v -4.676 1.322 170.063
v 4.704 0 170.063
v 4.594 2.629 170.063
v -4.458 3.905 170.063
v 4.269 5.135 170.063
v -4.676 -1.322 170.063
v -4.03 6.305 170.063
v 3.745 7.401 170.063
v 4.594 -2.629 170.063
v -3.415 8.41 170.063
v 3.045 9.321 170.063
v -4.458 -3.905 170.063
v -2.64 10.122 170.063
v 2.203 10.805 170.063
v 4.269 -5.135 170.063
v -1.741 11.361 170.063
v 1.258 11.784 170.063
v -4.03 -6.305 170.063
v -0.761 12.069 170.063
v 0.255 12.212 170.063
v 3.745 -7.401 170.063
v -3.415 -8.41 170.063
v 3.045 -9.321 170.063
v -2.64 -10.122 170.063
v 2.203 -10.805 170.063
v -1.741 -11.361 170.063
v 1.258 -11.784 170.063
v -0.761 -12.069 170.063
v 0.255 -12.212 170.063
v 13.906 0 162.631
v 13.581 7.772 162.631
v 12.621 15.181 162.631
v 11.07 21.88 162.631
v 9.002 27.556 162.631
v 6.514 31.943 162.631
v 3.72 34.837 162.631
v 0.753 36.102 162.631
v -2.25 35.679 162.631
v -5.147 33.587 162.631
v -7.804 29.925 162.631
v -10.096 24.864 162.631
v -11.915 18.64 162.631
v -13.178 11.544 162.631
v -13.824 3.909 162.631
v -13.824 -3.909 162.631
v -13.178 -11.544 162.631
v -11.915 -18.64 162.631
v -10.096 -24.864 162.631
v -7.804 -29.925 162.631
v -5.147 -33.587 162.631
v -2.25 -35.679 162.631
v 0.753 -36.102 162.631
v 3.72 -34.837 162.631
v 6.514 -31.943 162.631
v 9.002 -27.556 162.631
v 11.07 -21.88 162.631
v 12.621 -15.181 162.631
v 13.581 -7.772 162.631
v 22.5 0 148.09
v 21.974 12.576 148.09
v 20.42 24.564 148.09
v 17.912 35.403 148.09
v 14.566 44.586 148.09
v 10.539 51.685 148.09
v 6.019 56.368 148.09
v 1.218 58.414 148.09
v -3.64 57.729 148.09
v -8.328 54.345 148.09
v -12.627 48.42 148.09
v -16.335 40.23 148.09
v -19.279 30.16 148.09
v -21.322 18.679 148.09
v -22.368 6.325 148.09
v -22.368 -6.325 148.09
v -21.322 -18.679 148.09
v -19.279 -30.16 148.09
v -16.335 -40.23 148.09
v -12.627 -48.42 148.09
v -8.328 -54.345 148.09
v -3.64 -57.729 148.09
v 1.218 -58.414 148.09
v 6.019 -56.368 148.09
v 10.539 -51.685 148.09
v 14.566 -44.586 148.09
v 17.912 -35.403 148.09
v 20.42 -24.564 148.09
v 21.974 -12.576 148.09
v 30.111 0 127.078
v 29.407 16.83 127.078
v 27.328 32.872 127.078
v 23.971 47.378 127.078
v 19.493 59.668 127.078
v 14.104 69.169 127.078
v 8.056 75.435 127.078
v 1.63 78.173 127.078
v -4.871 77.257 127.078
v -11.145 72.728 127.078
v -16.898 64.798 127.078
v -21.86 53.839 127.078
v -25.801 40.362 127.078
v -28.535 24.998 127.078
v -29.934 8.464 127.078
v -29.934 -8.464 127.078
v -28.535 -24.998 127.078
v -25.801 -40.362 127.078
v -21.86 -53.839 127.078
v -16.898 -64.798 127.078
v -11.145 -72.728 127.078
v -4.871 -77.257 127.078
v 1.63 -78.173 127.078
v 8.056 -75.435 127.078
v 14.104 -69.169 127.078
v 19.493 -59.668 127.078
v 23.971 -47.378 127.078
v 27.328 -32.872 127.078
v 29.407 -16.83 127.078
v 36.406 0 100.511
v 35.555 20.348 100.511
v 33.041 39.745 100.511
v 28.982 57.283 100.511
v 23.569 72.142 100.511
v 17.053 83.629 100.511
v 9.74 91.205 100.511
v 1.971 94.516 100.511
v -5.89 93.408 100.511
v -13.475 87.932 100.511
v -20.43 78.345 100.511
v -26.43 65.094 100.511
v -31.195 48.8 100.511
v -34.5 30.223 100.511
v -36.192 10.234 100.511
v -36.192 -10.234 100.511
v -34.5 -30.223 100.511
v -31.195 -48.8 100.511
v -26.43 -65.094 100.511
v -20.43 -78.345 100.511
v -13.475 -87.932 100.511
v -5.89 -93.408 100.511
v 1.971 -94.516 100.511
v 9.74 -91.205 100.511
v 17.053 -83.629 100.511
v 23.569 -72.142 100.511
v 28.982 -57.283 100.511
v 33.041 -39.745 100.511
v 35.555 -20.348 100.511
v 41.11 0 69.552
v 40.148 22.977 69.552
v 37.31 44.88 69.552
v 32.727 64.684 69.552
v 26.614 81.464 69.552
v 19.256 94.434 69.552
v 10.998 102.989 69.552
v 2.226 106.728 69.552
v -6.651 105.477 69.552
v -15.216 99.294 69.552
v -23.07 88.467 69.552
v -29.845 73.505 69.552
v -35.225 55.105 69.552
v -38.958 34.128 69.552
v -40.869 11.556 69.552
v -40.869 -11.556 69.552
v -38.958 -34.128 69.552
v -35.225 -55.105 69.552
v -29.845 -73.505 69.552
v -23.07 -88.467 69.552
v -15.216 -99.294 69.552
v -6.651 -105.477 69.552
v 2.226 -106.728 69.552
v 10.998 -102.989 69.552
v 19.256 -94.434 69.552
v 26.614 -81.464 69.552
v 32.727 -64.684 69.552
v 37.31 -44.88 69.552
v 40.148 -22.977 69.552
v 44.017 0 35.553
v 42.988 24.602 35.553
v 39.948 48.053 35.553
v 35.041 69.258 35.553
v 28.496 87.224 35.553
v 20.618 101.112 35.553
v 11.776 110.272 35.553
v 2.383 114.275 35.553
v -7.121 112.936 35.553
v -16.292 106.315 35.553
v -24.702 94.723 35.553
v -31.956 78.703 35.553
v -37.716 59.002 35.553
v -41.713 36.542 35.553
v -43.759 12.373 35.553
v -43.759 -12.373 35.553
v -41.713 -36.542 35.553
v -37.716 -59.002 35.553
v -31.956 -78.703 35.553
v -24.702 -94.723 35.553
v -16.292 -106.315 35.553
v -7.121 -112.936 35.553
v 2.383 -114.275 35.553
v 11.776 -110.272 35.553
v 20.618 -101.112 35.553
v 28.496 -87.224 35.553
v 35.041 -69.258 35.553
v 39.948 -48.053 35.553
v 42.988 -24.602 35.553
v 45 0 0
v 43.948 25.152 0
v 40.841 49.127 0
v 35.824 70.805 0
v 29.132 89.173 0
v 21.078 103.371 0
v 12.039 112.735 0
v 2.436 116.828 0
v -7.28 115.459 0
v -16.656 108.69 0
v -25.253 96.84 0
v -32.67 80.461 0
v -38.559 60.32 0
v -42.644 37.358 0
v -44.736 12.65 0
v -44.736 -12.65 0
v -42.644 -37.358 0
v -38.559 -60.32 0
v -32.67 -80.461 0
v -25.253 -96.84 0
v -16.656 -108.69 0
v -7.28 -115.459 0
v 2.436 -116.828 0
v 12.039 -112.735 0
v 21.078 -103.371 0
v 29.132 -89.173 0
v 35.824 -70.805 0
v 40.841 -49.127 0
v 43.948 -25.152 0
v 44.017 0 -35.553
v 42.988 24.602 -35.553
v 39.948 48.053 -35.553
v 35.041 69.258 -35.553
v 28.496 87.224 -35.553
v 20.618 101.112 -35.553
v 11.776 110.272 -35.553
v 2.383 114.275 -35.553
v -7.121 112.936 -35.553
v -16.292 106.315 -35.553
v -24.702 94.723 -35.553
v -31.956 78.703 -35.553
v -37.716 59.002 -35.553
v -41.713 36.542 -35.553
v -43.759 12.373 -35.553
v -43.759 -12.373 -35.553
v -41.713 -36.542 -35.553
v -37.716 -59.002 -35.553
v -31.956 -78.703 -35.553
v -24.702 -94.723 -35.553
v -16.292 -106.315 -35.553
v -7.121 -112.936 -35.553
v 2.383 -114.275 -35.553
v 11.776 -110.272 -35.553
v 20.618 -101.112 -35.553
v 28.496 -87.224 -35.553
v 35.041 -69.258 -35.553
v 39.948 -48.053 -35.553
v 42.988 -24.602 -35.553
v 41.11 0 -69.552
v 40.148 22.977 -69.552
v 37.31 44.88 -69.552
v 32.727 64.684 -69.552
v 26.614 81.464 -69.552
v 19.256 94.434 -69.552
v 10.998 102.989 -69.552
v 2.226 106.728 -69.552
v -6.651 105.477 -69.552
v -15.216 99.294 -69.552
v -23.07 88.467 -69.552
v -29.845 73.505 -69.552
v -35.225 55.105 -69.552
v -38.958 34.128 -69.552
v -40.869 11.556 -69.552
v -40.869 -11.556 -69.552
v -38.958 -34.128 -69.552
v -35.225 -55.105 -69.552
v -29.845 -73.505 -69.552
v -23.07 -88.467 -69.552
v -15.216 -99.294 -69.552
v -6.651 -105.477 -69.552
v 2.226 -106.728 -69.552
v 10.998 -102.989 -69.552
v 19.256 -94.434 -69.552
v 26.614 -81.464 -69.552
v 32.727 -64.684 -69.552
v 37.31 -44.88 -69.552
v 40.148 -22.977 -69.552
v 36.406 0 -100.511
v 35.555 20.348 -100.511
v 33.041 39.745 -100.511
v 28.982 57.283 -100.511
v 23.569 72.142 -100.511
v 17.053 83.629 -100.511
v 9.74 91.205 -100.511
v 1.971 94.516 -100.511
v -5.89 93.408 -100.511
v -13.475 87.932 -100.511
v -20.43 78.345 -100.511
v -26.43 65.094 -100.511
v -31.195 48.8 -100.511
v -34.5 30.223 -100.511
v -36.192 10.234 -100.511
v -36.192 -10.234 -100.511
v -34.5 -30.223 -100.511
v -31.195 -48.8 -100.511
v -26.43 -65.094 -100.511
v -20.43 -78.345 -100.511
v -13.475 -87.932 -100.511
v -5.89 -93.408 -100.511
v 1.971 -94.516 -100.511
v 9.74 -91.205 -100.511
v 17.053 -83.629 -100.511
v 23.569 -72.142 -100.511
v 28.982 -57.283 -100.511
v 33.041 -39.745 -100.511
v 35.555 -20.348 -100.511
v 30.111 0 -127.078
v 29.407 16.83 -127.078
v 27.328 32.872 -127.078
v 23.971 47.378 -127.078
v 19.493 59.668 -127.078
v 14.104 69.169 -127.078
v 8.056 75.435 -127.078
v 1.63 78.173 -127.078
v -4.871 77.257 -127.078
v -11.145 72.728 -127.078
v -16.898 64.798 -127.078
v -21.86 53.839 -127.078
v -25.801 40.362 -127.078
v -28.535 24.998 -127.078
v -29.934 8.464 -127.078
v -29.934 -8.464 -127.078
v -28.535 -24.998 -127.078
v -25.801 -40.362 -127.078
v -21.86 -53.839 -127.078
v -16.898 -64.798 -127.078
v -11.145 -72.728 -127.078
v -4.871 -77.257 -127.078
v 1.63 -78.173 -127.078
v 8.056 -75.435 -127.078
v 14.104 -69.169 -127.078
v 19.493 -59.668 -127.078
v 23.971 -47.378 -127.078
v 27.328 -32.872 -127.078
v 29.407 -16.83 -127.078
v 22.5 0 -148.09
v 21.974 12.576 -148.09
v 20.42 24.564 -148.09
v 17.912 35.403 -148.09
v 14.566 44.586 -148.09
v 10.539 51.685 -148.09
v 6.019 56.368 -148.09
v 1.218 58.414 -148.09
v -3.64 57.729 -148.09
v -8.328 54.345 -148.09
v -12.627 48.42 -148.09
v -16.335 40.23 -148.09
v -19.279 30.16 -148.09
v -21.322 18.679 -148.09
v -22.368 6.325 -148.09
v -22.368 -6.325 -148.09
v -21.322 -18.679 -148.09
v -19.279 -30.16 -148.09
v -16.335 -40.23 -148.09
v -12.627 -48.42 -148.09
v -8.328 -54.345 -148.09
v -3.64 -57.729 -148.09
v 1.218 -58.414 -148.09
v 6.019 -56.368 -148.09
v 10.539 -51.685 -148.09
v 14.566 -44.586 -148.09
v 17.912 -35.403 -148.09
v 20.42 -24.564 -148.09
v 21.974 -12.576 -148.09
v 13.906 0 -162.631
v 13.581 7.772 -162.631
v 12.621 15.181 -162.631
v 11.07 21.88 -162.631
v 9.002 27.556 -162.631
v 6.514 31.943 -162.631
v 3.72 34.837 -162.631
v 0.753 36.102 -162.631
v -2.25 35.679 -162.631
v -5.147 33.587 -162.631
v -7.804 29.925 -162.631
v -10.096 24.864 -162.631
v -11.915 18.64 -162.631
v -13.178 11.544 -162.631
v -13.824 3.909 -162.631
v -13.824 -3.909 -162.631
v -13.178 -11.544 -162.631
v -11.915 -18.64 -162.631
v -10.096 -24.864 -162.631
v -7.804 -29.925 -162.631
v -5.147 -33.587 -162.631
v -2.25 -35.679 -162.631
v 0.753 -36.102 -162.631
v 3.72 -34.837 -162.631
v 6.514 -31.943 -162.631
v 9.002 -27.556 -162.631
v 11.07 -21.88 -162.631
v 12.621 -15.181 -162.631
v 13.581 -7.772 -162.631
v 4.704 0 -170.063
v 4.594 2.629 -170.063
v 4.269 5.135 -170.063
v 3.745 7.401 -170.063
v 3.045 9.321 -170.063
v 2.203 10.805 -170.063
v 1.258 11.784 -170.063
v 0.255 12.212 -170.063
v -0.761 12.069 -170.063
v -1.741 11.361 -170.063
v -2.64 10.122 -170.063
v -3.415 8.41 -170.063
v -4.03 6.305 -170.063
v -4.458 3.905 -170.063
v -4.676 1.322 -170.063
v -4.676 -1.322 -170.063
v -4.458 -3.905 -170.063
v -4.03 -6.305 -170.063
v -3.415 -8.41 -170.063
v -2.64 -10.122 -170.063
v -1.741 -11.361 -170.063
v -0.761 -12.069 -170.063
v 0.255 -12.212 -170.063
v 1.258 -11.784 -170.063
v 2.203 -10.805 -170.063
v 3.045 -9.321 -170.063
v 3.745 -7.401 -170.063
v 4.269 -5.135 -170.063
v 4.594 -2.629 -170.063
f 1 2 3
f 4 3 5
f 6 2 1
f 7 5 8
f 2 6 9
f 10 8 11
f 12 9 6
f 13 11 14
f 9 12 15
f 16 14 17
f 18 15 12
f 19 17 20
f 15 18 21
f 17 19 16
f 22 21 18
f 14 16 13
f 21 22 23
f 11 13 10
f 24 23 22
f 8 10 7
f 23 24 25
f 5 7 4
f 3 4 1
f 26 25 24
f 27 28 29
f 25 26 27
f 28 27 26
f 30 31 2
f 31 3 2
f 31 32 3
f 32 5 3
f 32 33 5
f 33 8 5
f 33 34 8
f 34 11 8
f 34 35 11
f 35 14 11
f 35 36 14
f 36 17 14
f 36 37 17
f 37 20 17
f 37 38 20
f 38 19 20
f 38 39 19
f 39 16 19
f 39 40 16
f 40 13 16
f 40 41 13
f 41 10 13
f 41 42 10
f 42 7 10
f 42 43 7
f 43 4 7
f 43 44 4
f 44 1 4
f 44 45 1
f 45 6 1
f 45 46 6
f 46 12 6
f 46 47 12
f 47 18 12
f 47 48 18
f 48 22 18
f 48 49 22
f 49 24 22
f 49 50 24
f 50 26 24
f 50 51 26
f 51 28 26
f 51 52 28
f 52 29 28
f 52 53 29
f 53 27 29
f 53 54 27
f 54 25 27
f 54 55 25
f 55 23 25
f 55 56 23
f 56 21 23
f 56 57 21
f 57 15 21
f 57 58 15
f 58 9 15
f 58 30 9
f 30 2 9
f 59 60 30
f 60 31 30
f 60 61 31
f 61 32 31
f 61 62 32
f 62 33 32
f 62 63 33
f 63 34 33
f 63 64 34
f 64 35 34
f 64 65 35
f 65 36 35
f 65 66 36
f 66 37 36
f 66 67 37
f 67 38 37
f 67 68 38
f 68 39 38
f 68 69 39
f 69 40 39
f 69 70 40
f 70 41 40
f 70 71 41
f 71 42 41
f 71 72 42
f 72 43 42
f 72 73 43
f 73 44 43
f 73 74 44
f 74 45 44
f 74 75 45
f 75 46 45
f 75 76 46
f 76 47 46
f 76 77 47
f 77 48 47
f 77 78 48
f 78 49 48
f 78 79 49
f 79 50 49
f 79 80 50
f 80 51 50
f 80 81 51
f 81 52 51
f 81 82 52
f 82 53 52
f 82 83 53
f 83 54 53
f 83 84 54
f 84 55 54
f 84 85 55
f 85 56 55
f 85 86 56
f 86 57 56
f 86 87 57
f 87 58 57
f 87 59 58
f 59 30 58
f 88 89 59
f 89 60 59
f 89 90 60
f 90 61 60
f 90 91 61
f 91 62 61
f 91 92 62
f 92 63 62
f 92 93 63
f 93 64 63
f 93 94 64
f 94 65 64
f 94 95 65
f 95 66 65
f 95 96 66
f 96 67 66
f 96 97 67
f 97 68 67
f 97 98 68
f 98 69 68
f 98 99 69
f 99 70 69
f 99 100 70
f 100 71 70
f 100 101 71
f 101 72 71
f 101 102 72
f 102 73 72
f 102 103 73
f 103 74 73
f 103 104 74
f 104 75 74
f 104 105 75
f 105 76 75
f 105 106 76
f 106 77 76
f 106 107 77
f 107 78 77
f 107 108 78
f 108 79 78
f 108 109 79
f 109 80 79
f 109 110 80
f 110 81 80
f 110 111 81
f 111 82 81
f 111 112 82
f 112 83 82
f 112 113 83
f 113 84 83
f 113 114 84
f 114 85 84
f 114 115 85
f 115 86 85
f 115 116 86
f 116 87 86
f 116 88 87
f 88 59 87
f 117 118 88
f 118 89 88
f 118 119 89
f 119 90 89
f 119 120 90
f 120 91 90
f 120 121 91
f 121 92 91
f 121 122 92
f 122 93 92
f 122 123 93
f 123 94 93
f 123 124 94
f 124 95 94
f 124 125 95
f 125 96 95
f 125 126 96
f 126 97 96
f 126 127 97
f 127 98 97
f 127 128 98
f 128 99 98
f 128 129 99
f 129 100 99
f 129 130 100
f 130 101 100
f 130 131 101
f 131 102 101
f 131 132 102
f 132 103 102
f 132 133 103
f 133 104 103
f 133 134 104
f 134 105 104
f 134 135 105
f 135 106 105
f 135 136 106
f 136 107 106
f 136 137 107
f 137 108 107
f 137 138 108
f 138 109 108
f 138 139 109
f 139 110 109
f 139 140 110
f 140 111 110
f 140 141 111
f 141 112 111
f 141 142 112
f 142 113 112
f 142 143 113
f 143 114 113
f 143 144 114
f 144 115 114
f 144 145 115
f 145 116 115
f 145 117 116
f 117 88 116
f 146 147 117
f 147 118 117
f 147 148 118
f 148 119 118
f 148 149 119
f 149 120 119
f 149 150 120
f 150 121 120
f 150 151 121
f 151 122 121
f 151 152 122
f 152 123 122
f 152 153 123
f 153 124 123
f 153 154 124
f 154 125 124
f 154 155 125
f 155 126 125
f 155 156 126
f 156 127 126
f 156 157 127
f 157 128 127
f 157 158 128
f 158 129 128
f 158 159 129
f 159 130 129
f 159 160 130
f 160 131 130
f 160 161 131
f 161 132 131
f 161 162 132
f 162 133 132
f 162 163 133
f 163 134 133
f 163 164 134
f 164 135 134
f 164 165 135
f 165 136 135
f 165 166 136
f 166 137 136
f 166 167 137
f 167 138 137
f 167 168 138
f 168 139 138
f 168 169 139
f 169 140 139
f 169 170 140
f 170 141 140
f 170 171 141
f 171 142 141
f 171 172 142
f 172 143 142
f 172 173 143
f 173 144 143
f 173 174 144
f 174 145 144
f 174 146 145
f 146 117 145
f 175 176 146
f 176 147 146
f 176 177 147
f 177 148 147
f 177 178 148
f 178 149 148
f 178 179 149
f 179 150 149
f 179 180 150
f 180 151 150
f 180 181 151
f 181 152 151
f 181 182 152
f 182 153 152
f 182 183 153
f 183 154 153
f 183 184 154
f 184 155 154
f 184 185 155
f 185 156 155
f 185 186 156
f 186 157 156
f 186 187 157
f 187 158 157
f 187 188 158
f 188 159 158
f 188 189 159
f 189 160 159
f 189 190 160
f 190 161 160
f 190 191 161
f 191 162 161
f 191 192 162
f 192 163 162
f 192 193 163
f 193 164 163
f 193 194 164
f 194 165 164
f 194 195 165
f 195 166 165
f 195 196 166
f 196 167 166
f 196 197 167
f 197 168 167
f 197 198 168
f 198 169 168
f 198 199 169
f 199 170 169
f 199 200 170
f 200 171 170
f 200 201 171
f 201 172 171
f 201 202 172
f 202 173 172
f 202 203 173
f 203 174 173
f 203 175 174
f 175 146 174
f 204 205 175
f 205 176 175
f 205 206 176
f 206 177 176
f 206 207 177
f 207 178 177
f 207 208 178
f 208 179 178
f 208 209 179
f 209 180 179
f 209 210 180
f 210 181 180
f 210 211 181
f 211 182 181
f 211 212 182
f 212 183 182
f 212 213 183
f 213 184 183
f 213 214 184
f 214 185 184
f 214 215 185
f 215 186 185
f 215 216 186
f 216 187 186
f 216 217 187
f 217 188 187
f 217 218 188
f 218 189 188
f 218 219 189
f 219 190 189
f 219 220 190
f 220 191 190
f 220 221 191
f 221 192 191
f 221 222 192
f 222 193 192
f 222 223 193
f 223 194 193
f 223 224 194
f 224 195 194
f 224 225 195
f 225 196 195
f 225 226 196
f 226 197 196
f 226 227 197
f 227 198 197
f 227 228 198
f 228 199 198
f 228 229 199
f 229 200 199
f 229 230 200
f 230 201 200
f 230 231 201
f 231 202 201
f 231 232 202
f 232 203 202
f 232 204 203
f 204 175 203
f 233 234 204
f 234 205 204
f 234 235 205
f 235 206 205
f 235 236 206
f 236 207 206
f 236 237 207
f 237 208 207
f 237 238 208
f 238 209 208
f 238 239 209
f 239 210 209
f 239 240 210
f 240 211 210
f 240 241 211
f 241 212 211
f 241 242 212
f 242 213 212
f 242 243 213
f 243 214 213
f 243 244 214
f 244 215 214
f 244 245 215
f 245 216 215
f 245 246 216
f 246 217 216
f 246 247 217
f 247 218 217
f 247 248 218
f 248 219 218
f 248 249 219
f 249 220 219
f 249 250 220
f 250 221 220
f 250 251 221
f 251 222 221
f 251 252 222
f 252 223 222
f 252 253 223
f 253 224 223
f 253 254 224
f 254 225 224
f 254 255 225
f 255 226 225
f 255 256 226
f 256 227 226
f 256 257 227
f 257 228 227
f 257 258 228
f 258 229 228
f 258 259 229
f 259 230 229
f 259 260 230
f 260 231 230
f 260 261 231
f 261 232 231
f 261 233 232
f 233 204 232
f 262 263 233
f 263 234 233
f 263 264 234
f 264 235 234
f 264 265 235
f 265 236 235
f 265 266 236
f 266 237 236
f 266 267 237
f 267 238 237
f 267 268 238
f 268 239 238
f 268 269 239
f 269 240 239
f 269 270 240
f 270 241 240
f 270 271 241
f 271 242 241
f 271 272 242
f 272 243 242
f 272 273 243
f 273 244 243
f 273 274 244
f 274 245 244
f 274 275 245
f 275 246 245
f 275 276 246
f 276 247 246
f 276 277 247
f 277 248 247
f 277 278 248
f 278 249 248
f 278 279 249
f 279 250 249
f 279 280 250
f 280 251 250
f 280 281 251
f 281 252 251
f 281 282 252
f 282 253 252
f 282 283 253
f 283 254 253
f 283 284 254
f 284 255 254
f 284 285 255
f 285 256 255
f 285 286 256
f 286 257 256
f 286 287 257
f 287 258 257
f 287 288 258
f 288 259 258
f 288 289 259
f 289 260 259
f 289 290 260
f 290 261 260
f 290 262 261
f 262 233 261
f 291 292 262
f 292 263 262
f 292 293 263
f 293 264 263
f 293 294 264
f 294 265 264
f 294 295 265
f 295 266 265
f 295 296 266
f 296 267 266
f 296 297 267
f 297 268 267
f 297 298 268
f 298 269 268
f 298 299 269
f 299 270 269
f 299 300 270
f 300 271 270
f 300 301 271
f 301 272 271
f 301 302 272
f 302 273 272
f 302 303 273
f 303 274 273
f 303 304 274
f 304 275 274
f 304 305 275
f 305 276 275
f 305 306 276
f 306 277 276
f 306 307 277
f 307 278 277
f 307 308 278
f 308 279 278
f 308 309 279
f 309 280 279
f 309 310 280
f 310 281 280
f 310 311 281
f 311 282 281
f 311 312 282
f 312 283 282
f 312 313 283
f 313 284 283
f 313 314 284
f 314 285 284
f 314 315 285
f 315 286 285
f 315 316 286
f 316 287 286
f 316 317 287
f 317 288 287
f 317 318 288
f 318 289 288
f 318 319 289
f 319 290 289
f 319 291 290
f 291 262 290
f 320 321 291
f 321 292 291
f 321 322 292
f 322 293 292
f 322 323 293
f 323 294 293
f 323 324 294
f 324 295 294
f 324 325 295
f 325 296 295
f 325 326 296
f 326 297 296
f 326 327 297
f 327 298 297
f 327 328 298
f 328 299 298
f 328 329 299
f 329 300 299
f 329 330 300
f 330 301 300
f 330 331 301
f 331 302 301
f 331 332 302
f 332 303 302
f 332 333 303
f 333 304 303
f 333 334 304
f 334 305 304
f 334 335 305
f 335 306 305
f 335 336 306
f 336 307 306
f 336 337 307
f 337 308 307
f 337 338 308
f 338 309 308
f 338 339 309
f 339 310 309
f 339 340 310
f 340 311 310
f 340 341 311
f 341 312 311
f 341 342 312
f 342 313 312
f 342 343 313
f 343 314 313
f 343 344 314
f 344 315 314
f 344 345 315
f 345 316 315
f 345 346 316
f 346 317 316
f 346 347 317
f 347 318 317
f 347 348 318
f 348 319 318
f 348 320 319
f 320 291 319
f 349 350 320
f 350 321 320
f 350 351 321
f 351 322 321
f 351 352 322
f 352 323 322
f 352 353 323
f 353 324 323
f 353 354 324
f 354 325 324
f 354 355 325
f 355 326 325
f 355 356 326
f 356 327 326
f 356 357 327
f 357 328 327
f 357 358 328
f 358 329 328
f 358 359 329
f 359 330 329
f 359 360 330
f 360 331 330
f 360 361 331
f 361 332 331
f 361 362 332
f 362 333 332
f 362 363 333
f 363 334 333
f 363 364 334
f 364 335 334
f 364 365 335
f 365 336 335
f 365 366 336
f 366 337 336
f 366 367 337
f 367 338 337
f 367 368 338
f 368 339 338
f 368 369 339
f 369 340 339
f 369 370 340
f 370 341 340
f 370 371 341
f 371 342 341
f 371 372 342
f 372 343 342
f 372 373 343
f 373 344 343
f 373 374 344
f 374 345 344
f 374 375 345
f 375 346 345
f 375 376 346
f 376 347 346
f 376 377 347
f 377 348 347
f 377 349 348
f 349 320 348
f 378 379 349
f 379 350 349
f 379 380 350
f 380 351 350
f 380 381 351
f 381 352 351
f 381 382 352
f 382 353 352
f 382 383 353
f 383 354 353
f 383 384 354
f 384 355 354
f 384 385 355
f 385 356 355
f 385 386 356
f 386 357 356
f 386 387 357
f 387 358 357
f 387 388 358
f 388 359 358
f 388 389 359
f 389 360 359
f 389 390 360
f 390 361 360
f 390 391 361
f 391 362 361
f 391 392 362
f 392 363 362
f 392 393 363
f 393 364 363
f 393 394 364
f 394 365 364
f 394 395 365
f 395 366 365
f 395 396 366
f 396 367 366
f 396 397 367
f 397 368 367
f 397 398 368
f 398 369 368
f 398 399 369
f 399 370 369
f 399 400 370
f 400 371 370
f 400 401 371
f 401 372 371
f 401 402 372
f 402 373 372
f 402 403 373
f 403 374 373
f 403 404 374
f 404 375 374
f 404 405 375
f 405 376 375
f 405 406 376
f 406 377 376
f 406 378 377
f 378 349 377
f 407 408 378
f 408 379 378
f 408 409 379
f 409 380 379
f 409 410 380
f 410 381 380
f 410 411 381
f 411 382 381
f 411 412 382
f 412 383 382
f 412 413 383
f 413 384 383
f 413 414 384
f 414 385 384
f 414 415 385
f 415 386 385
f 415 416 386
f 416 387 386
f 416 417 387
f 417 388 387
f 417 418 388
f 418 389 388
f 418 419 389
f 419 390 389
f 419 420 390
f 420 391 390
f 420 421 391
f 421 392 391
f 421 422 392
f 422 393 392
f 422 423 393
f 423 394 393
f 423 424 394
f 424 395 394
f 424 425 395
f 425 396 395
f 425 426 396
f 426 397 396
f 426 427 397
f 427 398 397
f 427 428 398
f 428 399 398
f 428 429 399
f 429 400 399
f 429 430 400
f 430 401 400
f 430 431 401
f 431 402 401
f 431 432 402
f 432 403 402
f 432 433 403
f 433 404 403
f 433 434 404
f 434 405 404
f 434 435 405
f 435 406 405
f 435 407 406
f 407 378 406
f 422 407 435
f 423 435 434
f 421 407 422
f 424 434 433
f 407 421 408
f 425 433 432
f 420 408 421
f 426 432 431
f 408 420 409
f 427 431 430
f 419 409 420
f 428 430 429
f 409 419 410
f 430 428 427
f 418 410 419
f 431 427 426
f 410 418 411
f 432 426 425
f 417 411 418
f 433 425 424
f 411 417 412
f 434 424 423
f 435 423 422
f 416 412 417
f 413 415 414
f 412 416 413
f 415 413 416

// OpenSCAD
// Generated by SolidPython 1.0.1 on 2020-07-29 00:46:46


scale(v = [5, 13, 19]) {
	sphere(r = 9);
}
/***********************************************
*********      SolidPython code:      **********
************************************************
 
# import packages: SolidPython
from solid import *
from solid.utils import *
from itertools import chain, combinations, permutations


class Resize:

    def __init__(self, scad_file):
        self.scad_file = scad_file
        #self.scad_file = import_scad(scad_file)
        # cone/cylinder param:
        self.r1 = 0
        self.r2 = 0
        self.h = 0
        # rectangular prism param:
        self.w = 0
        self.l = 0
        # ellipse param:
        self.r = 0

    # import OpenScad code (file name corresponds to shape)


    # classify shape + parameters
    def assign(self, param1, param2, param3):
        if self.scad_file == 'cone.scad':
            self.r1 = param1
            self.r2 = param2
            self.h = param3
        elif self.scad_file == 'cylinder.scad':
            self.r1 = param1
            self.r2 = param2
            self.h = param3
        elif self.scad_file == 'rectangularPrism.scad':
            self.h = param1
            self.l = param2
            self.w = param3
        else:
            self.r = param1
            self.h = param2

    # resize parameters
    def iterate(self):
        x = range(3, 20, 2)
        i = 1
        if self.scad_file == 'cone.scad':
            tempList = list(permutations(x, 2))
            for temp in tempList:
                param1 = temp[0]
                param2 = temp[1]
                filepath = 'produced_scad_files/' + 'cone' + str(param1) + '_' + str(param2) + '_' + '.scad'
                scad_render_to_file(cylinder(h=param1, r1=param2, r2=0), filepath)

        elif self.scad_file == 'cylinder.scad':
            tempList = list(permutations(x, 3))
            for temp in tempList:
                param1 = temp[0]
                param2 = temp[1]
                filepath = 'produced_scad_files/' + 'cylinder' + str(param1) + '_' + str(param2) + '_' + '.scad'
                scad_render_to_file(cylinder(h=param1, r1=param2, r2=param2), filepath)

        elif self.scad_file == 'rectangularPrism.scad':
            tempList = list(permutations(x, 3))
            for temp in tempList:
                param1 = temp[0]
                param2 = temp[1]
                param3 = temp[2]
                filepath = 'produced_scad_files/' + 'rectangularPrism' + str(param1) + '_' + str(param2) + '_' + str(
                    param3) + '.scad'
                scad_render_to_file(cube(size=(param1, param2, param3)), filepath)

        elif self.scad_file == 'ellipse.scad':
            tempList = list(permutations(x, 4))
            for temp in tempList:
                param1 = temp[0]
                param2 = temp[1]
                param3 = temp[2]
                param4 = temp[3]
                filepath = 'produced_scad_files/' + 'ellipse' + str(param1) + '_' + str(param2) + '_' + str(param3) + '_' + str(param4) + '.scad'
                scad_render_to_file(scale([param1, param2, param3])(sphere(r=param4)), filepath)

    def render_to_scadfile(self):
        scad_render_to_file(scad, 'example.scad') 
 
************************************************/
